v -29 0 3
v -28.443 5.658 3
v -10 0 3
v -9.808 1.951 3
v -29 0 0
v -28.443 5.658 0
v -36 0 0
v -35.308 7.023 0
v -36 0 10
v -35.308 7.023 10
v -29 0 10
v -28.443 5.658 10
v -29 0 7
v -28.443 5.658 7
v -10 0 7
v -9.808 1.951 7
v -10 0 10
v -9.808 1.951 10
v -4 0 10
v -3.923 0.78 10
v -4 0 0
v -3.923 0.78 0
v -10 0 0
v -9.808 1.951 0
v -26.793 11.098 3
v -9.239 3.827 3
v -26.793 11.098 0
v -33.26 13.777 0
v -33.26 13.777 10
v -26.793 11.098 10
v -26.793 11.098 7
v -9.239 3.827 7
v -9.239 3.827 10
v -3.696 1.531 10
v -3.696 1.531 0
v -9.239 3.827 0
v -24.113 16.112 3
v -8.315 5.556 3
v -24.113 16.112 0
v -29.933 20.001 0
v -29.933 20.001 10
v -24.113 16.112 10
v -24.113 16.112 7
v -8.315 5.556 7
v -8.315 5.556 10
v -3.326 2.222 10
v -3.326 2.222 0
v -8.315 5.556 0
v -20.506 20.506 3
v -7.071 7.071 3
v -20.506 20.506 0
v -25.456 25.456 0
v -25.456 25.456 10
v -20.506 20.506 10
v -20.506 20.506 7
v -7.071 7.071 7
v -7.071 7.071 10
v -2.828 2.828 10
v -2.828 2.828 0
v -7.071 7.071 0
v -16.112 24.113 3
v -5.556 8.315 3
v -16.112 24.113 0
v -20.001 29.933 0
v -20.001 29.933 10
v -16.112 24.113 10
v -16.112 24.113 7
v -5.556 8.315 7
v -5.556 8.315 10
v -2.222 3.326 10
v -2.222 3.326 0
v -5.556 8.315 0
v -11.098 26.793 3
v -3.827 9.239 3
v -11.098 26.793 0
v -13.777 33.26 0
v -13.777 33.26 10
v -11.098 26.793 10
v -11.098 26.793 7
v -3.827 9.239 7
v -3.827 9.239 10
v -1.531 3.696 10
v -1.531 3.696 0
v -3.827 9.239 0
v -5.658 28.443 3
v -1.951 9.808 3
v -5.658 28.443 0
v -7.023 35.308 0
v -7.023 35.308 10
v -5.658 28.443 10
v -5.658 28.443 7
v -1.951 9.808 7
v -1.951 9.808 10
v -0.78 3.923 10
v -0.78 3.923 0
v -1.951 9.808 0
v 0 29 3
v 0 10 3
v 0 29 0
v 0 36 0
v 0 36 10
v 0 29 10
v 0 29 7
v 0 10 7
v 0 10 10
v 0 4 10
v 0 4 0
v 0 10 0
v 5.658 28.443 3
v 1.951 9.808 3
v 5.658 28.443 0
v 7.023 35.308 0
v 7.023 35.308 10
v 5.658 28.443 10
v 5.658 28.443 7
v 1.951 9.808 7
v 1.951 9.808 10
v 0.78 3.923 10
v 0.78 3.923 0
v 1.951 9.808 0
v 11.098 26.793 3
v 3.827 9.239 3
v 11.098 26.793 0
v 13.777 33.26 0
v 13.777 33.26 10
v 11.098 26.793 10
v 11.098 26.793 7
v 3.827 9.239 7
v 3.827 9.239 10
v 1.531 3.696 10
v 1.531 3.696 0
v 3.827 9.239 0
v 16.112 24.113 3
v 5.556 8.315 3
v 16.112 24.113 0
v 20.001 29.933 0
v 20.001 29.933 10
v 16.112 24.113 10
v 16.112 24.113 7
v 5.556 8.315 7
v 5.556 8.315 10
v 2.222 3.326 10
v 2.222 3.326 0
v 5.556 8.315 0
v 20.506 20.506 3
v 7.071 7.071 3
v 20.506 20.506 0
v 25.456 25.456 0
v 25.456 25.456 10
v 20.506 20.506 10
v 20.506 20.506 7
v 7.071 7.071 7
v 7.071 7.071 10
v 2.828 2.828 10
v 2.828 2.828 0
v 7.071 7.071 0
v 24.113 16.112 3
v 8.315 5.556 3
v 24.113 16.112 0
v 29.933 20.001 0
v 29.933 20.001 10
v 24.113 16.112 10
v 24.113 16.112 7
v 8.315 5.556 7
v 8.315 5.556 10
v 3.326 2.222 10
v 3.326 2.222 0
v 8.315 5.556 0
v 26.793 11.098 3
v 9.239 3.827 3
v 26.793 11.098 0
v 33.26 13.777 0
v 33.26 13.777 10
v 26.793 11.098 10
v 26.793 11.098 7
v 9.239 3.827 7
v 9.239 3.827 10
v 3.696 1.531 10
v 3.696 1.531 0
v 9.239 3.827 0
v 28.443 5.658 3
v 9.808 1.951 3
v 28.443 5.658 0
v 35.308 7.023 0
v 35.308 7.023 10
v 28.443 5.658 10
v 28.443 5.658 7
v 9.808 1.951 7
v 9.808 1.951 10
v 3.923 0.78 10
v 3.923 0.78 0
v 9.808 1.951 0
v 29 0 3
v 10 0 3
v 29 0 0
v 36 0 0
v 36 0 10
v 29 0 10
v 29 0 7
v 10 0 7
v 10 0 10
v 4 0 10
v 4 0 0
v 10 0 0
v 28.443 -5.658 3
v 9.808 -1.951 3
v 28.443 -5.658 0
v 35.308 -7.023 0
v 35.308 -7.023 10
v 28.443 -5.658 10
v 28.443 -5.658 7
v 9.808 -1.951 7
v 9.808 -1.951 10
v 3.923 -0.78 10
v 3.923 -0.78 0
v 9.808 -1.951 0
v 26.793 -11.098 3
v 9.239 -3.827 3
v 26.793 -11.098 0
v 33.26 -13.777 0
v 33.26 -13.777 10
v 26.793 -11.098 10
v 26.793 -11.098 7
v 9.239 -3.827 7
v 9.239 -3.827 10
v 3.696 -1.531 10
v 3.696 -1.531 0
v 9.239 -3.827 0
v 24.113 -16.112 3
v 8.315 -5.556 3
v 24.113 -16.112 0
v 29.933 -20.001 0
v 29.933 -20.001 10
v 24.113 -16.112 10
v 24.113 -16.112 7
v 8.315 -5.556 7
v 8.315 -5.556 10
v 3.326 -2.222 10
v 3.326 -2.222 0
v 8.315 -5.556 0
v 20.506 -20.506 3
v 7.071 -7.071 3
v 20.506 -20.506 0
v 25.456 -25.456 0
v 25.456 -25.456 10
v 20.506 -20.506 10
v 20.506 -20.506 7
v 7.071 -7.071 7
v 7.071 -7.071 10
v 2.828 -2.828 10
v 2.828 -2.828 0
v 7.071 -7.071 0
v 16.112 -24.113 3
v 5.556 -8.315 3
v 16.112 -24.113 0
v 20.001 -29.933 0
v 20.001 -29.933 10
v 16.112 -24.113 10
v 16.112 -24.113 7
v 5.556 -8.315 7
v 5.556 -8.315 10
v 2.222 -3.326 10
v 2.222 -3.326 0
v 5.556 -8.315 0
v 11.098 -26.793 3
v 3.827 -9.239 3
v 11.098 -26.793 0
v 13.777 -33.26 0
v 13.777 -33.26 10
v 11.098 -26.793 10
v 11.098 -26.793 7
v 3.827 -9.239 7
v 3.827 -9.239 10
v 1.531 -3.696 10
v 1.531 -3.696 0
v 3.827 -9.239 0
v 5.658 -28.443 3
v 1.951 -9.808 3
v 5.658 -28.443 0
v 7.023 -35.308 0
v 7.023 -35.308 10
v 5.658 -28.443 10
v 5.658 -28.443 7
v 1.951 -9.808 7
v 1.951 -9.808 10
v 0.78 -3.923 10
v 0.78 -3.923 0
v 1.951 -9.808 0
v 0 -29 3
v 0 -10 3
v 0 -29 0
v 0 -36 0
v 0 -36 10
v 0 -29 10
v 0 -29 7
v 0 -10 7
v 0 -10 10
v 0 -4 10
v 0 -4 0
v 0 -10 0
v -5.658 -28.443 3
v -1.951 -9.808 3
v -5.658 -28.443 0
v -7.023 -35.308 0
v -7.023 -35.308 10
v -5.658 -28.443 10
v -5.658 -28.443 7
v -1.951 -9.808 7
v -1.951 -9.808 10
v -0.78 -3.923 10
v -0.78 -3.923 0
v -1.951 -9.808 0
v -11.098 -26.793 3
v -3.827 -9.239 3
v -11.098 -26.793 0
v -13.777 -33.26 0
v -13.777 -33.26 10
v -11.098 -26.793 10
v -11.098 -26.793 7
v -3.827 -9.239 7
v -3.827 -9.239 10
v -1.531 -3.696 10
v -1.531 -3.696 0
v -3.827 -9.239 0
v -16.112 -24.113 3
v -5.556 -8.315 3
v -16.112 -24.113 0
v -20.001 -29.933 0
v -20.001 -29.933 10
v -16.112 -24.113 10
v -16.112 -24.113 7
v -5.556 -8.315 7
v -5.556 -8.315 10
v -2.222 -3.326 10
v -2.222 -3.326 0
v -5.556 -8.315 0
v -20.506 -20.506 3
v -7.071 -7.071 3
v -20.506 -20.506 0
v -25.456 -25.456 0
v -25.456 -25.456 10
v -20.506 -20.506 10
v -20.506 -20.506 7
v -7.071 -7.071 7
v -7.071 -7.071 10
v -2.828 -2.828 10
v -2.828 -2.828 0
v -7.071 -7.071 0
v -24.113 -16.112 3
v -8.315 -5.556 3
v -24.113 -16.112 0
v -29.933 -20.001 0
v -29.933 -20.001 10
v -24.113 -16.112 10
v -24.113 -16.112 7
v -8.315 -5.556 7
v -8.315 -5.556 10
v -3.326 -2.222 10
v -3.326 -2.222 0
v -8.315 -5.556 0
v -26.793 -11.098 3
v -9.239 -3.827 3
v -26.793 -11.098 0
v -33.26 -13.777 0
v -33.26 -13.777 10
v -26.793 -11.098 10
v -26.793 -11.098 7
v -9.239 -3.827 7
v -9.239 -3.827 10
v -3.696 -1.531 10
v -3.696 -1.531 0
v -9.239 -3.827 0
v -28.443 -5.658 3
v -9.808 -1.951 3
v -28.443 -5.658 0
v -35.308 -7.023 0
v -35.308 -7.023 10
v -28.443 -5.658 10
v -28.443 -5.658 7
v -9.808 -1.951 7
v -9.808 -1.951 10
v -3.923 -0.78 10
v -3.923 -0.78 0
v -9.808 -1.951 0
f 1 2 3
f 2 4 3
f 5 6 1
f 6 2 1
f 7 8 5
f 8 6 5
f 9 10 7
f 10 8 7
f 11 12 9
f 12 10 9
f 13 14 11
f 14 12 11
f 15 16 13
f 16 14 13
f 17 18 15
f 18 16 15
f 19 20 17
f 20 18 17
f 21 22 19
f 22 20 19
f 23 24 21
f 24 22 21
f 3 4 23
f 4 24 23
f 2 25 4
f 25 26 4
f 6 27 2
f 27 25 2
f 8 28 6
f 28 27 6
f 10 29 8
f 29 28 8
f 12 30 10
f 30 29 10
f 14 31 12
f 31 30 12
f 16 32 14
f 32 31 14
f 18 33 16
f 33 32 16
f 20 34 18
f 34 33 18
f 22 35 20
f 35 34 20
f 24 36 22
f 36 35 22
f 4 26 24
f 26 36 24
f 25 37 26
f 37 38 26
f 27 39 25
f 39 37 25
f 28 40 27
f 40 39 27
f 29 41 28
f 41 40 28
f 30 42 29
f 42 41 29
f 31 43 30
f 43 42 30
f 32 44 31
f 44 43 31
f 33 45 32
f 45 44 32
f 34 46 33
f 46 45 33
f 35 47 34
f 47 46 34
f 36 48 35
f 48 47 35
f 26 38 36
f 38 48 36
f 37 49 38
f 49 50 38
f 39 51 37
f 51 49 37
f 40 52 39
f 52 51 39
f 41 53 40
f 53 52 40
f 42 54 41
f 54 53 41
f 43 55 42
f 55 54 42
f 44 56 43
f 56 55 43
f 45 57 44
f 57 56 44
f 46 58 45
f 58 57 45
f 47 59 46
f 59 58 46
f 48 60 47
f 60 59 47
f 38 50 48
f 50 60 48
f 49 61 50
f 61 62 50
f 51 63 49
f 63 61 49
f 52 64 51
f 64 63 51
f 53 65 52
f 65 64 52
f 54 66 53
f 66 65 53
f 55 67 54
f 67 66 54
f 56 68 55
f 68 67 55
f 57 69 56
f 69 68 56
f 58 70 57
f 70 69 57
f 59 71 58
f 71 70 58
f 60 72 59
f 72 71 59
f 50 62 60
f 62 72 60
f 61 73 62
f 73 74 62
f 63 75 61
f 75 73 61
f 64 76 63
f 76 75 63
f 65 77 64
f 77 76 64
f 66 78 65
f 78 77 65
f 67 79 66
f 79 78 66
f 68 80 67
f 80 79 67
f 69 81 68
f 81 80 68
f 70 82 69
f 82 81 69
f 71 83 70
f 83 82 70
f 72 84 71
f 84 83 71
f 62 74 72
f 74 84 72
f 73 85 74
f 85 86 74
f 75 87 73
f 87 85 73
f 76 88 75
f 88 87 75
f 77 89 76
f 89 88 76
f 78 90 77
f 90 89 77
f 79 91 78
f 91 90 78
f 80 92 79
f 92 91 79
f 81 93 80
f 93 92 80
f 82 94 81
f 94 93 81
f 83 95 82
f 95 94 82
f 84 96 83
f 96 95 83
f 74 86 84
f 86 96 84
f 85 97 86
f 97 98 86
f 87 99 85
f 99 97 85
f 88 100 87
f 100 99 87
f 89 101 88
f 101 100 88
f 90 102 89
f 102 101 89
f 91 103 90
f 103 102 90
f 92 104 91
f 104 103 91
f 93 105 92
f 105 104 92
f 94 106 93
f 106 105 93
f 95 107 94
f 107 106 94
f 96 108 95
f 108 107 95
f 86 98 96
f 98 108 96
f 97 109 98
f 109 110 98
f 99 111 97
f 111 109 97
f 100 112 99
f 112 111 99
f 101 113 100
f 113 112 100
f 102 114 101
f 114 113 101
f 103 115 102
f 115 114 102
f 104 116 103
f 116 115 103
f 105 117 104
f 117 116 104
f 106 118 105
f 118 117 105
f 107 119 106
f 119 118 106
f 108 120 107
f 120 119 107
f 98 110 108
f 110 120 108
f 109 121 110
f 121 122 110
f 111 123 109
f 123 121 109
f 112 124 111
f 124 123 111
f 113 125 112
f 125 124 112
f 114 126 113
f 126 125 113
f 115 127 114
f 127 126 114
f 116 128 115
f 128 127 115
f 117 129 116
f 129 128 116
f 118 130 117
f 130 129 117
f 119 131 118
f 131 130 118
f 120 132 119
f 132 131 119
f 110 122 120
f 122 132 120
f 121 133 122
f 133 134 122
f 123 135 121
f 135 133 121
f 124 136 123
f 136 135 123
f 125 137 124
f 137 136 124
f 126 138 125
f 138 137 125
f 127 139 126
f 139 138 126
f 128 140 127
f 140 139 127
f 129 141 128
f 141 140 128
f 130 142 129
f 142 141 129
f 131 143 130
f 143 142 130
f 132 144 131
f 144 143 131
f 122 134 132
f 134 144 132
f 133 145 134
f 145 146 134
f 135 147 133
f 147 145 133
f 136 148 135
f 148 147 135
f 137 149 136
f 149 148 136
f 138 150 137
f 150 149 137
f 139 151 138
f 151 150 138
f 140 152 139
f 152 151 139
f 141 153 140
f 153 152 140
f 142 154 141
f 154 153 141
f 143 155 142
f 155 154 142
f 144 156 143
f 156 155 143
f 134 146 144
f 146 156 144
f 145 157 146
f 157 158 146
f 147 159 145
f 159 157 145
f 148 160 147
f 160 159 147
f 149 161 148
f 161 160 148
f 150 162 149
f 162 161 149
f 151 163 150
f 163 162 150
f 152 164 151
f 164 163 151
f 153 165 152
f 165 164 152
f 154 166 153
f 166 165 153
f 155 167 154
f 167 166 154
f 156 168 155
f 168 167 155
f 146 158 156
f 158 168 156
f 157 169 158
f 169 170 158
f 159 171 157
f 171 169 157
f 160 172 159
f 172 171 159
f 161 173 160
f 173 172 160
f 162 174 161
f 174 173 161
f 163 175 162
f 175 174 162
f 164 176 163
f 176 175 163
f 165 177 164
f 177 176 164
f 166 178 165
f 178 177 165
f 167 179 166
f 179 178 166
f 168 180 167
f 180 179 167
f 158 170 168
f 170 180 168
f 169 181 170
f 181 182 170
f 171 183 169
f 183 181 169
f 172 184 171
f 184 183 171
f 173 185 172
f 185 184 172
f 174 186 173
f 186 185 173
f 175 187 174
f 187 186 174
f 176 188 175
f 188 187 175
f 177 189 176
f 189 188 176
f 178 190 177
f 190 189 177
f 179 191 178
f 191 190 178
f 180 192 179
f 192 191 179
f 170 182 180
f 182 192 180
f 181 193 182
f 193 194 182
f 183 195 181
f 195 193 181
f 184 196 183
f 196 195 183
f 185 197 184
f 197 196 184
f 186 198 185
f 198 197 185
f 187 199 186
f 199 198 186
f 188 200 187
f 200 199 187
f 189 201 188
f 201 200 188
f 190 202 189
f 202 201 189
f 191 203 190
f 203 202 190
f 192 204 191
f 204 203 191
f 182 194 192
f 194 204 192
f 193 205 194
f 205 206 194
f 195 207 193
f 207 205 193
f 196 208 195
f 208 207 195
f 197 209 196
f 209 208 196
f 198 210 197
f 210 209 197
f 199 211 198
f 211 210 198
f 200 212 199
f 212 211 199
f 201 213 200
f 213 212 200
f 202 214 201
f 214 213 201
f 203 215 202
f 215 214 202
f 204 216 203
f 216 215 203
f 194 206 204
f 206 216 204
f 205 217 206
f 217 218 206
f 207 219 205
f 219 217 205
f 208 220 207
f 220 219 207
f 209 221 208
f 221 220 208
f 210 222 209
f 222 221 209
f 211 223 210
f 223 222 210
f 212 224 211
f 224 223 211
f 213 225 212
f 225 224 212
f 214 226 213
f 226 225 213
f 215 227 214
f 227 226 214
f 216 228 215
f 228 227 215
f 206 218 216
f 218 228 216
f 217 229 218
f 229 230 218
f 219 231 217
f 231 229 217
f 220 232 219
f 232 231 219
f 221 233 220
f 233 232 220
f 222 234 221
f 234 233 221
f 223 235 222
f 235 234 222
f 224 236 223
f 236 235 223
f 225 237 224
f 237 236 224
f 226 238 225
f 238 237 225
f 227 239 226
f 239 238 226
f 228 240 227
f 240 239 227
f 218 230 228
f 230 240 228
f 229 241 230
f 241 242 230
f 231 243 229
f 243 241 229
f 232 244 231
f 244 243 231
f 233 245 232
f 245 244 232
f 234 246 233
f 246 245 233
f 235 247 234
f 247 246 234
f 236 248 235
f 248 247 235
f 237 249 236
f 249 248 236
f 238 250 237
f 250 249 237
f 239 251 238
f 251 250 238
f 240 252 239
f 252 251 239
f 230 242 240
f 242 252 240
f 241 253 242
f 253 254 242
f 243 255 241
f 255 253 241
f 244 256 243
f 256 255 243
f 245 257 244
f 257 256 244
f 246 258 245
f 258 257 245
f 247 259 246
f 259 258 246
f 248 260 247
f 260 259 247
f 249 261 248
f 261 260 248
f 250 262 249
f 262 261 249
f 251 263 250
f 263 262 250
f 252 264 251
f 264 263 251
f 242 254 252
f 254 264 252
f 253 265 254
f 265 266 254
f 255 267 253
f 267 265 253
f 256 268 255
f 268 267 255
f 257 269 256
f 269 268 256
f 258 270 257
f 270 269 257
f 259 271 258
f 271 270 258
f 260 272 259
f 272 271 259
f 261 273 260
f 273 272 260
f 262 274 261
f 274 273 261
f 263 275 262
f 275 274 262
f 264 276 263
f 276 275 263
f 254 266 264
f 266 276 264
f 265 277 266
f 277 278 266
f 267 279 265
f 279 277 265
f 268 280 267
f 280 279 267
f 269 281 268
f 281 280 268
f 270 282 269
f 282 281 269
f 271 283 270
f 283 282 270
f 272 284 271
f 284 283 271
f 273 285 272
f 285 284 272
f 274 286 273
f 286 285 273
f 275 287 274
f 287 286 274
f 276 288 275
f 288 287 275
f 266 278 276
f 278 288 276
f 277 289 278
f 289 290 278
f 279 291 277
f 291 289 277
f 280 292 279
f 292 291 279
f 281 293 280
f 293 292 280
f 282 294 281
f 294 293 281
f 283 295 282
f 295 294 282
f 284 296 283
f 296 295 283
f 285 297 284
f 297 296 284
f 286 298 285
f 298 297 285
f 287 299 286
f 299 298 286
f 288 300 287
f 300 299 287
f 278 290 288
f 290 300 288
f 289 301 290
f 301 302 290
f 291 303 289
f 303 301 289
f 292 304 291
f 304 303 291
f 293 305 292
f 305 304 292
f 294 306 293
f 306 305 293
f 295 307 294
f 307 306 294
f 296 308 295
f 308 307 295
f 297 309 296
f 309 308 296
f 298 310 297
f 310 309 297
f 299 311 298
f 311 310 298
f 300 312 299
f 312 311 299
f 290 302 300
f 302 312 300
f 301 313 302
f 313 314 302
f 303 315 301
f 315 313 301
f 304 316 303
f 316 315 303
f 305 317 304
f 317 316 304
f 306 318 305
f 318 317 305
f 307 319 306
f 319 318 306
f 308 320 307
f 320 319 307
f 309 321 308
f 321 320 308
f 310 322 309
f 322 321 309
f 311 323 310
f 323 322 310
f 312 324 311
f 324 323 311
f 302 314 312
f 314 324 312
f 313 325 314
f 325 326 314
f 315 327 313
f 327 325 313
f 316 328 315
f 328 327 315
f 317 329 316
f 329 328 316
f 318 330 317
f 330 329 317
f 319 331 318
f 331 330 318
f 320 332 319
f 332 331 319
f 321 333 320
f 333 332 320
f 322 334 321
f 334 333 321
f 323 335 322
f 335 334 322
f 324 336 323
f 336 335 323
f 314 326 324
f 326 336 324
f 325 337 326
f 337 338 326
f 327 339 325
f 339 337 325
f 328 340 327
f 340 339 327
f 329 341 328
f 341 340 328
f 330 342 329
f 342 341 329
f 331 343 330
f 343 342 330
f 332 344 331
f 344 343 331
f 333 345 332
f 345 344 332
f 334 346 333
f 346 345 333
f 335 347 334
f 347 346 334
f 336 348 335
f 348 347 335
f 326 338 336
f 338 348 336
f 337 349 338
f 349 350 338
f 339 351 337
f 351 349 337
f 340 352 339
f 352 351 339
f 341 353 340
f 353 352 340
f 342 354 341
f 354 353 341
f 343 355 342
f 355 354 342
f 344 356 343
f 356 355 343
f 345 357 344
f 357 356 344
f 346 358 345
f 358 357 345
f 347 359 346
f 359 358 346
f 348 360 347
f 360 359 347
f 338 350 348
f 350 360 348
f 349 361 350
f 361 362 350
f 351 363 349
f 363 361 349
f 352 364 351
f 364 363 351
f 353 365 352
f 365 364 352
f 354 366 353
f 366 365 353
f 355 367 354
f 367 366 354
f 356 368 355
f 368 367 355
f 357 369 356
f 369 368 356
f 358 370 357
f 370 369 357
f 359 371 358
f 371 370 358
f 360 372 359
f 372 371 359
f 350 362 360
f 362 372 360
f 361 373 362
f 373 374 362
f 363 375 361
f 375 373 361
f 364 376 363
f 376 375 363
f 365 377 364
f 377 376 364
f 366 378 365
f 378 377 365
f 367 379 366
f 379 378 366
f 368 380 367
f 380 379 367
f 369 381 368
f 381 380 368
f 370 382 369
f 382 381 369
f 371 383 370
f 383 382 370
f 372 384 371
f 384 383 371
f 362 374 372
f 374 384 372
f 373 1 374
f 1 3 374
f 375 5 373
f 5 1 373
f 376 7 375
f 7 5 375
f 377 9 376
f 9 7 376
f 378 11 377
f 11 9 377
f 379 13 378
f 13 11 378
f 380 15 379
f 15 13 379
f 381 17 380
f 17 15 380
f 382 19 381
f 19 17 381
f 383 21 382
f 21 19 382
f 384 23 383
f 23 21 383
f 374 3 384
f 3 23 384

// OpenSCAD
$fn = 32;

// ----------------------------------------------------------------------
// Revolved part: handwheel R36
// ----------------------------------------------------------------------

// --- parameters (mm) ---
bore_r = 4;               // bore radius
rim_r = 36;               // rim radius
rim_w = 7;                // rim axial width
rim_t = 10;               // rim diameter height
hub_r = 10;               // hub radius
web_t = 4;                // web thickness
revolve_angle = 360;      // revolve sweep, degrees

bore_d = 2 * bore_r;
rim_d = 2 * rim_r;
hub_d = 2 * hub_r;

profile = [[4, 0], [10, 0], [10, 3], [29, 3], [29, 0], [36, 0], [36, 10], [29, 10], [29, 7], [10, 7], [10, 10], [4, 10]];  // primary outline, 12 points, counter clockwise

// --- the one profile operation ---
rotate_extrude(angle = revolve_angle) polygon(points = profile);
